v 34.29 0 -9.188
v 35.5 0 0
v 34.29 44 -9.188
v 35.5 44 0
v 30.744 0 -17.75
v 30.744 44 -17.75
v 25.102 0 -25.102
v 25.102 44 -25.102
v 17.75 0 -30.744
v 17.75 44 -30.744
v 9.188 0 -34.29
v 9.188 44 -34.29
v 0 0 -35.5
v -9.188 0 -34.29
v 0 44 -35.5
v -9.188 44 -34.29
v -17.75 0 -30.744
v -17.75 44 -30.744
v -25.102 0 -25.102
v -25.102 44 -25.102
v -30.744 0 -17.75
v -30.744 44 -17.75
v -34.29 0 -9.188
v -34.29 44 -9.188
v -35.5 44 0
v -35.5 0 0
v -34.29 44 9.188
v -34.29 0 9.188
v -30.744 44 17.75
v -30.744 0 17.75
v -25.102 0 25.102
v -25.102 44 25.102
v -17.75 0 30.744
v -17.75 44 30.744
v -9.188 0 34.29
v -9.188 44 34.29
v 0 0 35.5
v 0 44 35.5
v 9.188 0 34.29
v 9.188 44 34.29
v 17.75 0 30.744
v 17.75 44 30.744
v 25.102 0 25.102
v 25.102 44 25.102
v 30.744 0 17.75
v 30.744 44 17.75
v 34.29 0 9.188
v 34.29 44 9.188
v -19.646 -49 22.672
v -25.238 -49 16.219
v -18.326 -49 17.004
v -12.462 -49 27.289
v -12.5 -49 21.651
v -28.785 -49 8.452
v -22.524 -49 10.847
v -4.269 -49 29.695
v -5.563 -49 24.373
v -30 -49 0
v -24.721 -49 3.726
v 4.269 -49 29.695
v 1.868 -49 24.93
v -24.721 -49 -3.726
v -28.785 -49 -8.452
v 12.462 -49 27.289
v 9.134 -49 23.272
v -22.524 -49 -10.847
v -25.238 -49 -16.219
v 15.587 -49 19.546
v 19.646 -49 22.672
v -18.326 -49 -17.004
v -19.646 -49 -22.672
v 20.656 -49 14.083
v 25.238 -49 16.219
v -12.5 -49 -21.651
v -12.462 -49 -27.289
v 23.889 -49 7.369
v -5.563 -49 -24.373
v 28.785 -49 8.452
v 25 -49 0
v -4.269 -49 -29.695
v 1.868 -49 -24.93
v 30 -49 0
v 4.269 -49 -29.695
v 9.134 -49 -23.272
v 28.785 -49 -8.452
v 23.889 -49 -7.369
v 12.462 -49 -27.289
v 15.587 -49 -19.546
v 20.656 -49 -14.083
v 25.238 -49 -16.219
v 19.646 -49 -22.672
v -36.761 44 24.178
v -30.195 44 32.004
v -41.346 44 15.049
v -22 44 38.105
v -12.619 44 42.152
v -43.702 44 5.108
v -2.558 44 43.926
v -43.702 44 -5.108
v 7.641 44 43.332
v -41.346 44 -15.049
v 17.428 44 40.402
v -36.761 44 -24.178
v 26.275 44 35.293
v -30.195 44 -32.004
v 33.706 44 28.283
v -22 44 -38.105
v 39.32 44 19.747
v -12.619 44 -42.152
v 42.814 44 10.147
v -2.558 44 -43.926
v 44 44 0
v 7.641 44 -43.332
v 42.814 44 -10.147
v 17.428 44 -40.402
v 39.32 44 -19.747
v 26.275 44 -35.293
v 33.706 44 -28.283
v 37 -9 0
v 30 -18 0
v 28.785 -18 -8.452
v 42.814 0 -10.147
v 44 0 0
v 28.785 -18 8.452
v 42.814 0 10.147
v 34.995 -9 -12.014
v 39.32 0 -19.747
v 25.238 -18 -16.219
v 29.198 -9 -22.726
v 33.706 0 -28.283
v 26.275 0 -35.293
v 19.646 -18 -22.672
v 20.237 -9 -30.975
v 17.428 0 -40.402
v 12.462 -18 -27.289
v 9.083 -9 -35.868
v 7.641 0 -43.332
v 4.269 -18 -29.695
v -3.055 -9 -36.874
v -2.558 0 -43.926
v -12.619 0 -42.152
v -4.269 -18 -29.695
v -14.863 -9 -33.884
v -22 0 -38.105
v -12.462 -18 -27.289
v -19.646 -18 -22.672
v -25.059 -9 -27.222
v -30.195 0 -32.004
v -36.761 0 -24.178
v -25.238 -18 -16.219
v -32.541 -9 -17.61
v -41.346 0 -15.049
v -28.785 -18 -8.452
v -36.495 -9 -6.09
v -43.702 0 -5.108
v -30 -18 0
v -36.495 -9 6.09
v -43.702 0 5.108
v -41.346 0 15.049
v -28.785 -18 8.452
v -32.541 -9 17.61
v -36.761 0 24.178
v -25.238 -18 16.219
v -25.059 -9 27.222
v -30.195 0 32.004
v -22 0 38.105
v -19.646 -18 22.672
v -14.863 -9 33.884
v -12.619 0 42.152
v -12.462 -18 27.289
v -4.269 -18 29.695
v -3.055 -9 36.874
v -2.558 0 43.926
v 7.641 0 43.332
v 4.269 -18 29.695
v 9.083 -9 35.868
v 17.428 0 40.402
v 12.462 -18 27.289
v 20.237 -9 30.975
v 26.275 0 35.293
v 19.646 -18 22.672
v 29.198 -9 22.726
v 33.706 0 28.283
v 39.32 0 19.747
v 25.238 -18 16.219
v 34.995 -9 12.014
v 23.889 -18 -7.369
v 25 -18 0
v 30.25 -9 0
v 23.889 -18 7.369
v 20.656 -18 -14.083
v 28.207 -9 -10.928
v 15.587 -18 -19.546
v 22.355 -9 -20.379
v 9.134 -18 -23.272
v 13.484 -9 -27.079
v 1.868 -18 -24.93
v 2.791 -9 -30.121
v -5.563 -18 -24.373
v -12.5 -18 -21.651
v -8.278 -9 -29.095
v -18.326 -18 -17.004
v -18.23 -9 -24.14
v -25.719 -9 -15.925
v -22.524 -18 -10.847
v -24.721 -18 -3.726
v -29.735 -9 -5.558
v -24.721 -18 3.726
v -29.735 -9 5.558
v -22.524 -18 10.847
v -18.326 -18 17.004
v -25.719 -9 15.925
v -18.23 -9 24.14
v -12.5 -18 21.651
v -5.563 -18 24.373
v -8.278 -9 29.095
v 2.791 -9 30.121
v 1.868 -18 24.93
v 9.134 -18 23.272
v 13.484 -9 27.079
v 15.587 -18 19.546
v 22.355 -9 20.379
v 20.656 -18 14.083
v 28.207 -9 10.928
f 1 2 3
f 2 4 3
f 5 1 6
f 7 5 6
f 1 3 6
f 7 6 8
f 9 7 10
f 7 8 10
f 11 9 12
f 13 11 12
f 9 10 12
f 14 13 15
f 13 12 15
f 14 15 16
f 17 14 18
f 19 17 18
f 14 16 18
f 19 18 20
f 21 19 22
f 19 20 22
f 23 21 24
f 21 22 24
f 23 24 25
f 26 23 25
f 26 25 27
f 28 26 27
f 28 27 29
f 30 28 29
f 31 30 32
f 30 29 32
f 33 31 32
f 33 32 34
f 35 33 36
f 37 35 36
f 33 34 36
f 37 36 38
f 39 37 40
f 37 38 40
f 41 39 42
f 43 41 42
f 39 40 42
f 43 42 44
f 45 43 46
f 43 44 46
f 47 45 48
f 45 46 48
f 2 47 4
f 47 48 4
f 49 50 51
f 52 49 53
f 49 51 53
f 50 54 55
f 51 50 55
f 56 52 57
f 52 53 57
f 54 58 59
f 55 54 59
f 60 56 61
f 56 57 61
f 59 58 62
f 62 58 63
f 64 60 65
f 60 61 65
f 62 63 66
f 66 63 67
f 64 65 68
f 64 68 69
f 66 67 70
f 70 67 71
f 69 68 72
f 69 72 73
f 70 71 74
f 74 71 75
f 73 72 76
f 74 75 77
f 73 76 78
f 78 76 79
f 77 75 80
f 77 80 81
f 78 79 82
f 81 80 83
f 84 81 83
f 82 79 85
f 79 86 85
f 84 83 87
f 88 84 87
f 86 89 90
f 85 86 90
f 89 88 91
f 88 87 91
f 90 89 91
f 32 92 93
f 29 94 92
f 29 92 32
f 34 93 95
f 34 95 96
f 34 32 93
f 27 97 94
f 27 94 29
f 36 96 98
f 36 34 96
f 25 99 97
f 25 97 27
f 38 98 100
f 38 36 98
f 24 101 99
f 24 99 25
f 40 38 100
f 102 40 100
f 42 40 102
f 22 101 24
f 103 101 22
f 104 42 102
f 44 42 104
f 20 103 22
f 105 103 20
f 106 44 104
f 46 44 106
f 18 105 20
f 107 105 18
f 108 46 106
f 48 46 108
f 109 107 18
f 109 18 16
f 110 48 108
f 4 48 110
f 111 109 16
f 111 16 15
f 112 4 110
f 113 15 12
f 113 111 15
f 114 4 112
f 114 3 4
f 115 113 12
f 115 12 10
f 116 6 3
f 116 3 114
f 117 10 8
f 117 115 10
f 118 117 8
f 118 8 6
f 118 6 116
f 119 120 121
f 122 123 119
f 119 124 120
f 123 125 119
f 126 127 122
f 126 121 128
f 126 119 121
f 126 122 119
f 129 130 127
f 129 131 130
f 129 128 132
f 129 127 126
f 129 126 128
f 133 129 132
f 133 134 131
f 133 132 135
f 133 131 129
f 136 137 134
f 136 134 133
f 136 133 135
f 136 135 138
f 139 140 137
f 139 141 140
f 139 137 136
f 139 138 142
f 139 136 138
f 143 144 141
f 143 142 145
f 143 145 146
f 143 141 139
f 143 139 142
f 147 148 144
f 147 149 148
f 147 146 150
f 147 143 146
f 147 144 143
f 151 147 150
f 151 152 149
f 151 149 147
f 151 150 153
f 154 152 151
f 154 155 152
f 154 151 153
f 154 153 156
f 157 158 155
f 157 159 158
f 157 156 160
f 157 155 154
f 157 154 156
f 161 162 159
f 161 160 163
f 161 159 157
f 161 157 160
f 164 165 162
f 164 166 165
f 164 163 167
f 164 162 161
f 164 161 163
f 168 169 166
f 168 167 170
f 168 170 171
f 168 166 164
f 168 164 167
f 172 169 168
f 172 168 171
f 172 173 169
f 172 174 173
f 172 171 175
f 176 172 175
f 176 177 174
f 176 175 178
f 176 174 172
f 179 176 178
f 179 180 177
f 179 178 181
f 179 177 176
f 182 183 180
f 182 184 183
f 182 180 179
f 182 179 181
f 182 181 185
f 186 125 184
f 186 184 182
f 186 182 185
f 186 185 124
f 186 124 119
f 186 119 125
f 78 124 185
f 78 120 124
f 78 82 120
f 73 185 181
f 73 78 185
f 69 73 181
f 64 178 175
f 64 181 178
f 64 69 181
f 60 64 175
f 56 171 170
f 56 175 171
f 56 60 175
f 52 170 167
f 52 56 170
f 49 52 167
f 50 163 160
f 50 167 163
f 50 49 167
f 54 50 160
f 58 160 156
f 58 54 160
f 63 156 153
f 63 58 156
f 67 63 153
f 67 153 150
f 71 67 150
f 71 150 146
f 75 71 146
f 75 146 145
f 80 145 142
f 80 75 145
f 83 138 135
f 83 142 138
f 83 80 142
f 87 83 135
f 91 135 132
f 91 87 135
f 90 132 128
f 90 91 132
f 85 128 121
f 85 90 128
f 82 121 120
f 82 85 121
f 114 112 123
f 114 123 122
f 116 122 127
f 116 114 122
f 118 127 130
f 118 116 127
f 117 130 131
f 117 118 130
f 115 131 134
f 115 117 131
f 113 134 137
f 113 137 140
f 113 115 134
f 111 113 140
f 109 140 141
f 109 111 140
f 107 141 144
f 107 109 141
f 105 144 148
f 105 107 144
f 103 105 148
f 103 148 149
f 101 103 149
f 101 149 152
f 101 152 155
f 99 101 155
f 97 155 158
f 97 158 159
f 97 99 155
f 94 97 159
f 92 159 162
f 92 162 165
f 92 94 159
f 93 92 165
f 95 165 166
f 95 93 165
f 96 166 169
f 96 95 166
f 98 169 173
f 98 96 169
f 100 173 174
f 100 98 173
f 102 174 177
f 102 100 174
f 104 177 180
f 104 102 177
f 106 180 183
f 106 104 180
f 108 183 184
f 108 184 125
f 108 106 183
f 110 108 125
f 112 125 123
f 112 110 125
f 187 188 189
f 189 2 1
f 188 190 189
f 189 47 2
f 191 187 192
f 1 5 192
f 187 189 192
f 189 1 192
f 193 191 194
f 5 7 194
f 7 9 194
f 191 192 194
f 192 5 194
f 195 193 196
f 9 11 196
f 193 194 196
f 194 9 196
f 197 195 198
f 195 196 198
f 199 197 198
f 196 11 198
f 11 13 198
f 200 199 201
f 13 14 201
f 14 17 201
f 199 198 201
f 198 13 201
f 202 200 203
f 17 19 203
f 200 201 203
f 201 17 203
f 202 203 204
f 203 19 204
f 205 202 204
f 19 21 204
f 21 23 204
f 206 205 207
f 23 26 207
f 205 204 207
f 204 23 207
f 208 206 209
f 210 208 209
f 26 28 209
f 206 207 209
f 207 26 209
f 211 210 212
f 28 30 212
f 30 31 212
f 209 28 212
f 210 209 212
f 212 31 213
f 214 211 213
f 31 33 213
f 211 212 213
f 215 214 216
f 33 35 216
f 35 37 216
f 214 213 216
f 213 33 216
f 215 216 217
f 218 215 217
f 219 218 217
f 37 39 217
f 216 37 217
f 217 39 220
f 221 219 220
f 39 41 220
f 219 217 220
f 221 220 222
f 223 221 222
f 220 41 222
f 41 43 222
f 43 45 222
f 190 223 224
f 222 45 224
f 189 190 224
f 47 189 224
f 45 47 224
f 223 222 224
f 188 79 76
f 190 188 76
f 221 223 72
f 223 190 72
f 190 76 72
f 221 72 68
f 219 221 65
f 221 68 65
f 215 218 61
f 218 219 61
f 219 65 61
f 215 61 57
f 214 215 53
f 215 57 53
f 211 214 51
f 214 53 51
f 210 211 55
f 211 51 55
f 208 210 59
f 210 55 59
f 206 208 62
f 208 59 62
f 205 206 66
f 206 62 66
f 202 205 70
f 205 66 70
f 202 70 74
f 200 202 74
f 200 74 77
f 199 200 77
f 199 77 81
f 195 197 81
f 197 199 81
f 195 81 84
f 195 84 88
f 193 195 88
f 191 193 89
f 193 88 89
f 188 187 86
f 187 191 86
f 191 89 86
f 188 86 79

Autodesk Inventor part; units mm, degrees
ref_plane "YZ Plane" through (0, 0, 0) normal (1, 0, 0) x (0, 1, 0)
ref_plane "XZ Plane" through (0, 0, 0) normal (0, 1, 0) x (-1, 0, 0)
ref_plane "XY Plane" through (0, 0, 0) normal (0, 0, 1) x (1, 0, 0)
sketch "Sketch1" plane through (0, 0, 0) normal (0, 0, 1) x (1, 0, 0)
  line L0 (0, 0) -> (35.5, 0)
  line L1 (35.5, 0) -> (35.5, 44)
  line L2 (35.5, 44) -> (0, 44)
  line L3 (0, 44) -> (0, 0)
  line L4 (0, 0) -> (0, -18)
  line L5 (0, -18) -> (25, -18)
  line L6 (25, -18) -> (25, -49)
  line L7 (25, -49) -> (0, -49)
  line L8 (0, -49) -> (0, -18)
  line L9 (35.5, 0) -> (25, -18)
  line L10 (0, 0) -> (44, 0)
  line L11 (44, 0) -> (44, 44)
  line L12 (44, 44) -> (0, 44)
  line L13 (0, 44) -> (0, 0)
  line L14 (0, -18) -> (30, -18)
  line L15 (30, -18) -> (30, -49)
  line L16 (30, -49) -> (0, -49)
  line L17 (0, -49) -> (0, -18)
  line L18 (30, -18) -> (44, 0)
  dimension "d13" = 35.5
  dimension "d14" = 44
  dimension "d15" = 18
  dimension "d16" = 25
  dimension "d17" = 31
  dimension "d18" = 44
  dimension "d19" = 30
revolve "Revolution1" add sketch "Sketch1" angle 360 about axis through (0, -49, 0) along (0, 1, 0) contours L10 L18 L14 L9 | L1 L12 L11 L10 | L14 L15 L16 L6
properties part number "PVC_connector" material "PVC-Piping"
